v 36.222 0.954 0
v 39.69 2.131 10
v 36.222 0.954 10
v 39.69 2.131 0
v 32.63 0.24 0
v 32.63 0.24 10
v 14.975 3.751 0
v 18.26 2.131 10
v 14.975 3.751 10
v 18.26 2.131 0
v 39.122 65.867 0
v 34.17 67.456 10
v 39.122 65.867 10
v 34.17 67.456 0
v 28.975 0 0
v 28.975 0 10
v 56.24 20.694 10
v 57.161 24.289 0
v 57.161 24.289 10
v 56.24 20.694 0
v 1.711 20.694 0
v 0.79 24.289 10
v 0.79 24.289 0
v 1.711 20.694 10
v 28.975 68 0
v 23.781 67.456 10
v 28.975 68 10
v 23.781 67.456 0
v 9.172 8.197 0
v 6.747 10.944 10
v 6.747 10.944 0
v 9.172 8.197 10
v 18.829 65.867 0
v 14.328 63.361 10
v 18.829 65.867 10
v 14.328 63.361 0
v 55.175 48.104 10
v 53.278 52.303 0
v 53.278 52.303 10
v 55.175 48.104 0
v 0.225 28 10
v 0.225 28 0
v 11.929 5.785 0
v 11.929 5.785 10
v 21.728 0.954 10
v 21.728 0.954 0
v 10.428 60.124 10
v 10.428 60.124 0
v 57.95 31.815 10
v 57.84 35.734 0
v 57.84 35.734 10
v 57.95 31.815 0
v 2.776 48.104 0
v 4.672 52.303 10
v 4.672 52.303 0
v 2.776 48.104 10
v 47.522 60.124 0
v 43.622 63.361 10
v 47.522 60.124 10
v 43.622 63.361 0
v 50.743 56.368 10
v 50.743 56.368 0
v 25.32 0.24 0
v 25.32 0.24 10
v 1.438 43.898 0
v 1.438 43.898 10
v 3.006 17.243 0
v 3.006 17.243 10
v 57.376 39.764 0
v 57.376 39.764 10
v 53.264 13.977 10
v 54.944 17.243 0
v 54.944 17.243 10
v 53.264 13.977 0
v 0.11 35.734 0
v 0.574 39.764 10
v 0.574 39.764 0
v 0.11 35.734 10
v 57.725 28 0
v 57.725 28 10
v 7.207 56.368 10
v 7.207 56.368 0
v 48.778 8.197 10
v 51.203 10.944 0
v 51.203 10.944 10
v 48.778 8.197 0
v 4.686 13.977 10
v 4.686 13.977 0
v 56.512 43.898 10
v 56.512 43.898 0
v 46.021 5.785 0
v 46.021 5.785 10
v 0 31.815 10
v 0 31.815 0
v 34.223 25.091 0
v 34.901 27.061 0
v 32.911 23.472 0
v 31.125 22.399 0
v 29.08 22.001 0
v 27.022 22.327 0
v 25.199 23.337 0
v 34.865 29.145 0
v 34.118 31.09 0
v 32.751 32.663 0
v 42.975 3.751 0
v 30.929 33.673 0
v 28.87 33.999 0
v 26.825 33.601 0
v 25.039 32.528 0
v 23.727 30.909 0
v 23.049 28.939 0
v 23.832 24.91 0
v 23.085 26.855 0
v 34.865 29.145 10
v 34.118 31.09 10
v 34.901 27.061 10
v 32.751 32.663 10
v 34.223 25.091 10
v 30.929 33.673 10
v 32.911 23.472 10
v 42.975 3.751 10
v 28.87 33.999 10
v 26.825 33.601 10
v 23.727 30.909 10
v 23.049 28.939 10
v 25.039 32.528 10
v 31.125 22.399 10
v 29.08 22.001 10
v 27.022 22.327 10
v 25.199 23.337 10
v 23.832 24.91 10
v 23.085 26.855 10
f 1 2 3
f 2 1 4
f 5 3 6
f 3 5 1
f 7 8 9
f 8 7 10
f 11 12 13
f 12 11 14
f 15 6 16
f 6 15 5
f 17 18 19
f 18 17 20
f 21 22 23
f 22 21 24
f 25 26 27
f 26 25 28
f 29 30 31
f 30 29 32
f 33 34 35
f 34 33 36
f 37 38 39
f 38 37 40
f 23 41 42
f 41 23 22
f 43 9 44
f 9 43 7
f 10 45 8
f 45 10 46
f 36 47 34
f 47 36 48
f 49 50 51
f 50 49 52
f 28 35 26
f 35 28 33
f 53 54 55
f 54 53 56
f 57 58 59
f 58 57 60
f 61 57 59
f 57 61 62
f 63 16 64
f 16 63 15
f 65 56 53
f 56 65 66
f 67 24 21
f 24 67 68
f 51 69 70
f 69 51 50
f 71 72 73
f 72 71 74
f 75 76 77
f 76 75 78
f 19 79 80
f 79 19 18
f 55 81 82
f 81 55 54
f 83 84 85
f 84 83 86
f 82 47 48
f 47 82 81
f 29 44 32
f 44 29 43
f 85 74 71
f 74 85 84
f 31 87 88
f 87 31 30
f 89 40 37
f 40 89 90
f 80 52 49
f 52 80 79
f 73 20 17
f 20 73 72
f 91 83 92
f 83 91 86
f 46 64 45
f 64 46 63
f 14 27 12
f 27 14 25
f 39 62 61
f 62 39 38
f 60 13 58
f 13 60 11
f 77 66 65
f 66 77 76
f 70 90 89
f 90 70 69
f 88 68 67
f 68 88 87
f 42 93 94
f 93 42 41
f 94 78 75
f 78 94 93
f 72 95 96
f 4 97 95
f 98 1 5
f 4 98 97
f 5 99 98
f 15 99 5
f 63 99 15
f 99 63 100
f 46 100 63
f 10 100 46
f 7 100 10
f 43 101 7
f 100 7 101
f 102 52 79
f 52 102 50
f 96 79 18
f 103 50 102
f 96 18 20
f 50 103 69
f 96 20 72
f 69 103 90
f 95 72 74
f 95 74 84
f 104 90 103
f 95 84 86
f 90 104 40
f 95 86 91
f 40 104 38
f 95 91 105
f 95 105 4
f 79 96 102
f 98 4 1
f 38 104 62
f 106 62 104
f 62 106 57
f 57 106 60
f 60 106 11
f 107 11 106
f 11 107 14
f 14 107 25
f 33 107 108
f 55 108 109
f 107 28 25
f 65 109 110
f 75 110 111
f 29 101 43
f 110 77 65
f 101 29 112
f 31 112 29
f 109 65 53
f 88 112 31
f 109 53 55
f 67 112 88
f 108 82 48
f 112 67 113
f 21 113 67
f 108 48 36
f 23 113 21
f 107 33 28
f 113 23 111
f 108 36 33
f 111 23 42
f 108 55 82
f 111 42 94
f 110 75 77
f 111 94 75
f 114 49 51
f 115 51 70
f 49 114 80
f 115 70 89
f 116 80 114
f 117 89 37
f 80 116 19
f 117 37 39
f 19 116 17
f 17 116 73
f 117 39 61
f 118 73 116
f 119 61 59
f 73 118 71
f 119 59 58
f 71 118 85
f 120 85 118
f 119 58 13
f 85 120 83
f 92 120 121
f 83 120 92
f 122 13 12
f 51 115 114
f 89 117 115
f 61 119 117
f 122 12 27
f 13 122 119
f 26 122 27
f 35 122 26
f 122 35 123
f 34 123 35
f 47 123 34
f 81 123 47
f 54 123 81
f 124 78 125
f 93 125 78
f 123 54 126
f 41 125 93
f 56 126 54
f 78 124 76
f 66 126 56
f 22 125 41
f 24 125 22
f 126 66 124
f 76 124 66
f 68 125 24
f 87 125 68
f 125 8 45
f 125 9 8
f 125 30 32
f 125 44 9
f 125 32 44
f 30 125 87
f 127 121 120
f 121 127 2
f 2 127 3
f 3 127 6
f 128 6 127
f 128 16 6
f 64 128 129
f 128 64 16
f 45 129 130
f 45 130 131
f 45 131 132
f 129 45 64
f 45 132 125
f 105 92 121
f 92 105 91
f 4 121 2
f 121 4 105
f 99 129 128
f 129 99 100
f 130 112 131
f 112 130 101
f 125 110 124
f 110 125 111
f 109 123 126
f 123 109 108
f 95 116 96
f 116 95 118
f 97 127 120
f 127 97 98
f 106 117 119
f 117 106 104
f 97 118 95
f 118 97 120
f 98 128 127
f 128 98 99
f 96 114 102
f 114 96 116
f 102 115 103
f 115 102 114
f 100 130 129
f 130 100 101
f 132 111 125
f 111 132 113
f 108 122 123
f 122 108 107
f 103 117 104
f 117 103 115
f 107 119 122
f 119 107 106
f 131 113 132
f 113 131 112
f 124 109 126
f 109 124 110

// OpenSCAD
$fn = 32;

// ----------------------------------------------------------------------
// Cam plate: single_lobe cam, base R28
// ----------------------------------------------------------------------

// --- parameters (mm) ---
base_r = 28;              // base circle radius
lobe_h = 12;              // cam lobe rise
bore_r = 6;               // shaft bore radius
plate_t = 10;             // plate thickness, Z (extrusion height)

profile = [[57.725, 28], [57.95, 31.815], [57.84, 35.734], [57.376, 39.764], [56.512, 43.898], [55.175, 48.104], [53.278, 52.303], [50.743, 56.368], [47.522, 60.124], [43.622, 63.361], [39.122, 65.867], [34.17, 67.456], [28.975, 68], [23.781, 67.456], [18.829, 65.867], [14.328, 63.361], [10.428, 60.124], [7.207, 56.368], [4.672, 52.303], [2.776, 48.104], [1.438, 43.898], [0.574, 39.764], [0.11, 35.734], [0, 31.815], [0.225, 28], [0.79, 24.289], [1.711, 20.694], [3.006, 17.243], [4.686, 13.977], [6.747, 10.944], [9.172, 8.197], [11.929, 5.785], [14.975, 3.751], [18.26, 2.131], [21.728, 0.954], [25.32, 0.24], [28.975, 0], [32.63, 0.24], [36.222, 0.954], [39.69, 2.131], [42.975, 3.751], [46.021, 5.785], [48.778, 8.197], [51.203, 10.944], [53.264, 13.977], [54.944, 17.243], [56.24, 20.694], [57.161, 24.289]];  // primary outline, 48 points, counter clockwise
void_1 = [[34.865, 29.145], [34.118, 31.09], [32.751, 32.663], [30.929, 33.673], [28.87, 33.999], [26.825, 33.601], [25.039, 32.528], [23.727, 30.909], [23.049, 28.939], [23.085, 26.855], [23.832, 24.91], [25.199, 23.337], [27.022, 22.327], [29.08, 22.001], [31.125, 22.399], [32.911, 23.472], [34.223, 25.091], [34.901, 27.061]];  // shaft bore, 18 points

// --- the one profile operation ---
difference() {
  linear_extrude(height = plate_t) polygon(points = profile);
  translate([0, 0, -1])
    linear_extrude(height = plate_t + 2) polygon(points = void_1);
}
